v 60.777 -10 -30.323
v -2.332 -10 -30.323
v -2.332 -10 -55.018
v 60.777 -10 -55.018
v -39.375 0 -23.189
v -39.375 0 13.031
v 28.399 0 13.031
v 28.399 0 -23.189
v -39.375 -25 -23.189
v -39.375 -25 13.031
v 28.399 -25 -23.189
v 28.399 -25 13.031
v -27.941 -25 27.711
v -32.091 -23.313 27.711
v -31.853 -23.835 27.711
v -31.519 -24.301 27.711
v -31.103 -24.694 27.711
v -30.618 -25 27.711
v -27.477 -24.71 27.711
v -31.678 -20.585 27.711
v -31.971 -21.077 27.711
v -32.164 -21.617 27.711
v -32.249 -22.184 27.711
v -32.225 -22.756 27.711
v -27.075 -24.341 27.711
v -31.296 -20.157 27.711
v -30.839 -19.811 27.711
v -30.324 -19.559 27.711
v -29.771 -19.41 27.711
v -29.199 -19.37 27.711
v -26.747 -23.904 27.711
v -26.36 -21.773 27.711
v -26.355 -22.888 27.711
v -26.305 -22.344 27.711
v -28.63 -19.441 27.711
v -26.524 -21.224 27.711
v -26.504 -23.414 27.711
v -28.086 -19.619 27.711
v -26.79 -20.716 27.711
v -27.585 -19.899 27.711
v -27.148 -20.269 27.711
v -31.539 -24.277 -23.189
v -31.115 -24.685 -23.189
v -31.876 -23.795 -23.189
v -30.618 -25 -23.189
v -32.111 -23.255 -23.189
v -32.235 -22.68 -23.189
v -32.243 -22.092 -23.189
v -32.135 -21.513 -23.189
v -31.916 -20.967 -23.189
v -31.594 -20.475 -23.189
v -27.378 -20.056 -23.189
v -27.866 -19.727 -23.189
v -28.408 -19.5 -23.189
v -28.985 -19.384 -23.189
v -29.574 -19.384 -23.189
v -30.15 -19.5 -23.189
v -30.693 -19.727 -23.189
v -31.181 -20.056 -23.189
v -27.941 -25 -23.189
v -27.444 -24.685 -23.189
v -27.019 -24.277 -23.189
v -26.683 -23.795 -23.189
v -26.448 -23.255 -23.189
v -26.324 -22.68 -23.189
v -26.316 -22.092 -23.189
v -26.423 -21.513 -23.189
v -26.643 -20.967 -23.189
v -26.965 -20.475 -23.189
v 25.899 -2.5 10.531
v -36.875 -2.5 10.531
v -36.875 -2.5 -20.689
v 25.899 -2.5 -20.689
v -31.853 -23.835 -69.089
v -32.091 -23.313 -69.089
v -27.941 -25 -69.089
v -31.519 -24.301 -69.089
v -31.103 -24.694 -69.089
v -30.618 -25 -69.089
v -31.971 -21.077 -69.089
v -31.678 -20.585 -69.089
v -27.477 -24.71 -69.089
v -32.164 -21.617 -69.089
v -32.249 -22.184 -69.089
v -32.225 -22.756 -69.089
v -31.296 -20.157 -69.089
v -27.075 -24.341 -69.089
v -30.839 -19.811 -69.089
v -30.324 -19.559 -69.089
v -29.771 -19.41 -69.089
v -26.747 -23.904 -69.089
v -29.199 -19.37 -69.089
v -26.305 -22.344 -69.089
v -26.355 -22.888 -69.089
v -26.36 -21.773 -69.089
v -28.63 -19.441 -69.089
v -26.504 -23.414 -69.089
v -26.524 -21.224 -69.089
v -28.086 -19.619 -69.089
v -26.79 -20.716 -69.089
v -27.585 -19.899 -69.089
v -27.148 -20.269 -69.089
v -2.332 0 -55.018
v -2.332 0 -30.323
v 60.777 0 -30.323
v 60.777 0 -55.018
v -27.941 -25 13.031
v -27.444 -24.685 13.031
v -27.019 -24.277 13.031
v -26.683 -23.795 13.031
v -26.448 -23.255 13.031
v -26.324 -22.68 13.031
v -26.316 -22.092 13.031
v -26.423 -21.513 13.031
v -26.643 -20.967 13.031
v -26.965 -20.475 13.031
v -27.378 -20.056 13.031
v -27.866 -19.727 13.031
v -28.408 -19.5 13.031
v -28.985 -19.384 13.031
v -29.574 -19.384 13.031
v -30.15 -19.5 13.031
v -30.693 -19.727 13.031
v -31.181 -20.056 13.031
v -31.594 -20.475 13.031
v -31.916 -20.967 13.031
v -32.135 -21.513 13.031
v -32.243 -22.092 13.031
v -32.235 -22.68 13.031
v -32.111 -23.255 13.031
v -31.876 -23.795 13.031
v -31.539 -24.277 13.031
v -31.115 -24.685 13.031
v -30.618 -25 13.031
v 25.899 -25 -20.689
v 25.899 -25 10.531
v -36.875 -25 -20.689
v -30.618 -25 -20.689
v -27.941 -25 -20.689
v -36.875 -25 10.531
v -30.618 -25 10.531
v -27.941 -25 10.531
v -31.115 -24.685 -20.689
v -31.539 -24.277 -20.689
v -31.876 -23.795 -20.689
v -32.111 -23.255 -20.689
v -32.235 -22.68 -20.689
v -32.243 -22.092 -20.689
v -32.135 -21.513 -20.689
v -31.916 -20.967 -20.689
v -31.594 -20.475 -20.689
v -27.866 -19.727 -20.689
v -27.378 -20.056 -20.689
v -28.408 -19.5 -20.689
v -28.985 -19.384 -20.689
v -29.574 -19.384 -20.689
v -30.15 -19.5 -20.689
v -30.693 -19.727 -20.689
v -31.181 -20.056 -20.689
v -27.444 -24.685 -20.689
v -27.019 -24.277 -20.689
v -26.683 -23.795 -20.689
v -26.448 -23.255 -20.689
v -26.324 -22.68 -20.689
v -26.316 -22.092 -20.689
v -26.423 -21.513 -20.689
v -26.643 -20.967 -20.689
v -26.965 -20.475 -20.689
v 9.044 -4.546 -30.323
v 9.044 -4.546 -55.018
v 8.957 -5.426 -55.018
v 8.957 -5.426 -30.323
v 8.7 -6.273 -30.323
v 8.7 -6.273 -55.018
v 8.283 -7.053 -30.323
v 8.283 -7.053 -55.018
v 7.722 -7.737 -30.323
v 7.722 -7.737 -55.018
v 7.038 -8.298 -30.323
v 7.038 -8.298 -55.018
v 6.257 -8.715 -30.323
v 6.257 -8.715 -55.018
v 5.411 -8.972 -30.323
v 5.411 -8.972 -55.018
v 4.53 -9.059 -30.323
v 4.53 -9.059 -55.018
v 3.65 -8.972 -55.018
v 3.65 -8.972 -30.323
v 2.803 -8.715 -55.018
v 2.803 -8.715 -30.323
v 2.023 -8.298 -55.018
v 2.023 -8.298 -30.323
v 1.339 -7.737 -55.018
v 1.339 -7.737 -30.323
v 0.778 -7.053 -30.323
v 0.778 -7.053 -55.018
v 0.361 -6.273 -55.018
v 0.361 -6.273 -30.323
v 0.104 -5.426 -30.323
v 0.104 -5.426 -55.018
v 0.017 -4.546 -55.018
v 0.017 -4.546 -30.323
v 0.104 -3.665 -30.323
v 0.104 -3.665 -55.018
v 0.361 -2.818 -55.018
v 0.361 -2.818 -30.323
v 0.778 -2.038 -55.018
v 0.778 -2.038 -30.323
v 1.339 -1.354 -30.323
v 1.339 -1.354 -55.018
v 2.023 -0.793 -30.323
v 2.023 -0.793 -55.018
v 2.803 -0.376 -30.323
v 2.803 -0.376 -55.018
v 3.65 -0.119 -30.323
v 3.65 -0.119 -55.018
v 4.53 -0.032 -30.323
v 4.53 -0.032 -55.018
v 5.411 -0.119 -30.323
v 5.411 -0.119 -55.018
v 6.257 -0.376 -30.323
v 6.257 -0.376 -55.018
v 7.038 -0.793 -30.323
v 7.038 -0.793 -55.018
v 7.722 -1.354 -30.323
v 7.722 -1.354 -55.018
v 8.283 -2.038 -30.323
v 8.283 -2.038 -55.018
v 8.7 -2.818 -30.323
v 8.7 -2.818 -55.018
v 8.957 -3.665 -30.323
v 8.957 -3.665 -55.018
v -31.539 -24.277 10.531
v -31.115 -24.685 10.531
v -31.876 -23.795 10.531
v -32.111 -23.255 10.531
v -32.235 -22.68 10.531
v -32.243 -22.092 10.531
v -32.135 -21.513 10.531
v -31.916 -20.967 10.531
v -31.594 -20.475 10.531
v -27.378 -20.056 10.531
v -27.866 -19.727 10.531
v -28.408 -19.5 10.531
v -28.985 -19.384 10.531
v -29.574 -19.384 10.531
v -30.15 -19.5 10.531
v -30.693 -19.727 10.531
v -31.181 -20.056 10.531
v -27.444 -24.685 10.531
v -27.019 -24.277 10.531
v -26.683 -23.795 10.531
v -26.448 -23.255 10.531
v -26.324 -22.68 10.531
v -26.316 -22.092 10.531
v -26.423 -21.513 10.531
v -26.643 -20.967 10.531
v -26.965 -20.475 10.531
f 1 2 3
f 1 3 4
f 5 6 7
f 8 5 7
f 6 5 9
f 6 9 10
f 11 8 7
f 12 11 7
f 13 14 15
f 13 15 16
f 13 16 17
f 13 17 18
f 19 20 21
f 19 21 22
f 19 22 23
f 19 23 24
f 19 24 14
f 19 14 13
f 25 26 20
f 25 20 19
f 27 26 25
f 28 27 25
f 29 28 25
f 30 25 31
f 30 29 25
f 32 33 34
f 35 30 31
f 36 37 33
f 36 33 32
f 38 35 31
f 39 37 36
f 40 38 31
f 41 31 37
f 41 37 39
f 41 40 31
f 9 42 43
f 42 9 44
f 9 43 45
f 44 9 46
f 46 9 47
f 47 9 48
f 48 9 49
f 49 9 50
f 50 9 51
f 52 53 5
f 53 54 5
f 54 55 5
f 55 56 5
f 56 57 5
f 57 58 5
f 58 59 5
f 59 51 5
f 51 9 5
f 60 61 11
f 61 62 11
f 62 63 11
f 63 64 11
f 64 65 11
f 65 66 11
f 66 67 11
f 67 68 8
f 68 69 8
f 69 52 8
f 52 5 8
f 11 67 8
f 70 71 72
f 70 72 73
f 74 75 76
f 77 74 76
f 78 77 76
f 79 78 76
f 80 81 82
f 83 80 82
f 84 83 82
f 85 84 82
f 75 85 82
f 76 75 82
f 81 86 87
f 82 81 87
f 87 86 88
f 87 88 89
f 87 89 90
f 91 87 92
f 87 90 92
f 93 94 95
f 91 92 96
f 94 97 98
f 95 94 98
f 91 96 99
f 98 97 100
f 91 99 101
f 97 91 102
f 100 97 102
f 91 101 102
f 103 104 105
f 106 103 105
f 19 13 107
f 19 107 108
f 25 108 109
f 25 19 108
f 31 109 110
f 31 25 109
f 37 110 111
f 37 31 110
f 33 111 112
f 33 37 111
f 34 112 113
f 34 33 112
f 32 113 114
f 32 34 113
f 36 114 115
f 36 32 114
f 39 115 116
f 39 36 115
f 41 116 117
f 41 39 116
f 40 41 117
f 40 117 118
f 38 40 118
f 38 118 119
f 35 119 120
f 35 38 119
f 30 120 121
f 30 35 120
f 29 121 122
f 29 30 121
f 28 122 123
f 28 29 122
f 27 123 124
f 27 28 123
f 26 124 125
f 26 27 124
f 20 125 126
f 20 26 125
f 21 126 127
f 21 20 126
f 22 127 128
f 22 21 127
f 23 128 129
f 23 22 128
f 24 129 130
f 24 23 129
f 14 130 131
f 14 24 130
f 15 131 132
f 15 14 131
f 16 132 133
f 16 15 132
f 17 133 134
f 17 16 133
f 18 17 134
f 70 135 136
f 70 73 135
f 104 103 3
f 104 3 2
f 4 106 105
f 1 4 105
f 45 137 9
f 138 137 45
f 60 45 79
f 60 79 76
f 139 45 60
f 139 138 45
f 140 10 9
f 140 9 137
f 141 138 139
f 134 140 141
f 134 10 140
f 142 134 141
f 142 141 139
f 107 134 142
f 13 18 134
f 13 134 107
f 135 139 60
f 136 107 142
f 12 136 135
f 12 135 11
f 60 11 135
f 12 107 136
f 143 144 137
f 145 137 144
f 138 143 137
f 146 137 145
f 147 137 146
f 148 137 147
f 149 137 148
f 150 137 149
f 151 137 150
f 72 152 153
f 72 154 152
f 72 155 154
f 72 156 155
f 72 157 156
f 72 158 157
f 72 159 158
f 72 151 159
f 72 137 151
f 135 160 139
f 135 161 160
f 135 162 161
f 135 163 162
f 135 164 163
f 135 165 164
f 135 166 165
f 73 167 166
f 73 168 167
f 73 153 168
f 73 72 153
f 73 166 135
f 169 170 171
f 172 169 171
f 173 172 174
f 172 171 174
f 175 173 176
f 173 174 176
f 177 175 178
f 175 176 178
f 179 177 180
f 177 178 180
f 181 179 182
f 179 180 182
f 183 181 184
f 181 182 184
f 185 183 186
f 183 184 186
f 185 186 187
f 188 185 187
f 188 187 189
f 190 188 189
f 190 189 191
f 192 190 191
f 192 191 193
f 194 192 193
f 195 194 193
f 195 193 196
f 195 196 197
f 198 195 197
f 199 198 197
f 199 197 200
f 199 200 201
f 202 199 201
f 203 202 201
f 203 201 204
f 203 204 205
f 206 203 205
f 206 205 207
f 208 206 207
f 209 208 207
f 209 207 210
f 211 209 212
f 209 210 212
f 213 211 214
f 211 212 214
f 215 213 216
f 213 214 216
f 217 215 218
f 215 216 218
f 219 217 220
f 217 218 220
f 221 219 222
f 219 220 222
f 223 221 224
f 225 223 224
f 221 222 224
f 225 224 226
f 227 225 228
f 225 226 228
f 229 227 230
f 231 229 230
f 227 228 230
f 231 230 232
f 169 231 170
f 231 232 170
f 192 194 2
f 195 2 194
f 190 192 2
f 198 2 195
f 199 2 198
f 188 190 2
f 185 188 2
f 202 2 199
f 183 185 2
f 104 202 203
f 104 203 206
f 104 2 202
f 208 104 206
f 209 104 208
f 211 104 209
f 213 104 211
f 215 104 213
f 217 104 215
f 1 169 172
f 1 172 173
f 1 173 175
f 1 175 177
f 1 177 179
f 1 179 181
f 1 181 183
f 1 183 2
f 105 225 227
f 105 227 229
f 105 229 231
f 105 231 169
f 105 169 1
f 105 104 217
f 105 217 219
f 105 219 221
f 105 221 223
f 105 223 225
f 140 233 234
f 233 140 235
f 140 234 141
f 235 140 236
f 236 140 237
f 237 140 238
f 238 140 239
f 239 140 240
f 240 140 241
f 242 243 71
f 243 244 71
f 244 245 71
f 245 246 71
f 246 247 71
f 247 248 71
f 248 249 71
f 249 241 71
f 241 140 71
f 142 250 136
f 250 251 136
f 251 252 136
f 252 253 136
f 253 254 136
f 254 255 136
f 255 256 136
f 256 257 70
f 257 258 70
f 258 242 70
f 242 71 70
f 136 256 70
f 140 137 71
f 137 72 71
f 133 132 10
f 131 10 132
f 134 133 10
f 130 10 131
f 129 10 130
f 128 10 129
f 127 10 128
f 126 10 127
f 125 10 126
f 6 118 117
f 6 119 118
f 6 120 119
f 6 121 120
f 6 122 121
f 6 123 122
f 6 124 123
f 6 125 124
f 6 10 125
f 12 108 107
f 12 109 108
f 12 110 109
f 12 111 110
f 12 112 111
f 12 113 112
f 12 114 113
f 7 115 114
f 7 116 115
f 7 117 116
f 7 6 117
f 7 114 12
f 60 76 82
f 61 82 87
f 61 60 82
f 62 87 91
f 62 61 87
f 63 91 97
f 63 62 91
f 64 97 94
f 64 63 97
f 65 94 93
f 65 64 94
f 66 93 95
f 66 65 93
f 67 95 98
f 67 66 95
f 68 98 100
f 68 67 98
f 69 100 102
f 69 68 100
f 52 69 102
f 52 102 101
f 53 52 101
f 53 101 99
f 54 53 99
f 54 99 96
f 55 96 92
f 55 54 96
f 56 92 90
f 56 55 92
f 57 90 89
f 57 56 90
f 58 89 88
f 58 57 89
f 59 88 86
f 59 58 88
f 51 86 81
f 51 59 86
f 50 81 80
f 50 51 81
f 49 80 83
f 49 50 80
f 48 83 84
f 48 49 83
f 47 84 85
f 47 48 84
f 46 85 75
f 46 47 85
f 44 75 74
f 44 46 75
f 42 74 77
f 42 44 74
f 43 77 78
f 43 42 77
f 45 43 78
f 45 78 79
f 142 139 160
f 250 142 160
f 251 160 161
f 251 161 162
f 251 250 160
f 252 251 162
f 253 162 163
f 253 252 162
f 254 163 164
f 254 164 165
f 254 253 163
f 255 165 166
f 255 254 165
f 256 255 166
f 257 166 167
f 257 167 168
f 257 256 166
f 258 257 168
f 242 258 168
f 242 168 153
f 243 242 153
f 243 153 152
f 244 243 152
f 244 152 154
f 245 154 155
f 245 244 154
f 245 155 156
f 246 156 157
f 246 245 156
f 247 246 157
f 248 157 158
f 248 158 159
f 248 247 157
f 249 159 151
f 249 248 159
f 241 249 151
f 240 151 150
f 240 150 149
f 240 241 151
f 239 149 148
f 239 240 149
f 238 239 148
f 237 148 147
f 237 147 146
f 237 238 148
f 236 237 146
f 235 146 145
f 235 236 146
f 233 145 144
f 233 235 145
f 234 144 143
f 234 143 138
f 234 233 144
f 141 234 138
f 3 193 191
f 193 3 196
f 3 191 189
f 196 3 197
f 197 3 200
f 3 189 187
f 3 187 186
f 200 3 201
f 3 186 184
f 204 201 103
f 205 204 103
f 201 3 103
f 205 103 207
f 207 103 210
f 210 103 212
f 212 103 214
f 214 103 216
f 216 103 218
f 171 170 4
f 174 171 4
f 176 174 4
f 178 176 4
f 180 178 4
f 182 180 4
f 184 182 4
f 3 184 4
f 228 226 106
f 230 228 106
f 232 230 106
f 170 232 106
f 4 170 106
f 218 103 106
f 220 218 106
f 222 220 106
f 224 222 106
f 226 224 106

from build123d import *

# Parameters (mm, degrees)
F0_W      = 67.7743945271
F0_H      = 36.2195130438
F1_DEPTH  = 25
F2_T      = -2.5
F4_DEPTH  = 48.4
F6_W      = 63.1097578444
F6_H      = 24.6951244771
F7_DEPTH  = 10
F9_R      = 4.5132770752
F10_DEPTH = 82.7302714655


with BuildPart() as f1:
    # F0 (on Front) → F1 (new body)
    with BuildSketch(Plane.XZ):
        with Locations((-5.4878061637, -5.0790766254)):
            Rectangle(F0_W, F0_H)
    extrude(amount=F1_DEPTH)

    # F2
    f2_openings = [f1.faces().sort_by_distance(p)[0] for p in [
        (-5.487806, -25, -5.079077),
    ]]
    offset(amount=F2_T, openings=f2_openings)

    # F3 (on face) → F4 (join, symmetric)
    with BuildSketch(Plane.XY.offset(-20.6888331473)):
        with BuildLine():
            ThreePointArc((-27.9406612677, -25), (-26.7466375137, -23.9035563981), (-26.3048927837, -22.3438311368))
            ThreePointArc((-26.3048927837, -22.3438311368), (-30.8390522813, -19.8111416305), (-30.6179927724, -25))
            Line((-30.6179927724, -25), (-27.9406612677, -25))
        make_face()
    extrude(amount=F4_DEPTH, both=True)


with BuildPart() as f5_1:
    # F5: copy of F1
    add(f1.part)


with BuildPart() as f7:
    # F6 (on Front) → F7 (new body)
    with BuildSketch(Plane.XZ):
        with Locations((29.222561745, -42.6705423743)):
            Rectangle(F6_W, F6_H)
    extrude(amount=F7_DEPTH)

    # F9 (on face) → F10 (cut, through all)
    with BuildSketch(Plane(origin=(0, 0, -55.0181046128), x_dir=(1, 0, 0), z_dir=(0, 0, -1))):
        with Locations((4.5302640647, 4.5455978252)):
            Circle(F9_R)
    extrude(amount=-F10_DEPTH, mode=Mode.SUBTRACT)


solid = Compound([f1.part, f7.part])
